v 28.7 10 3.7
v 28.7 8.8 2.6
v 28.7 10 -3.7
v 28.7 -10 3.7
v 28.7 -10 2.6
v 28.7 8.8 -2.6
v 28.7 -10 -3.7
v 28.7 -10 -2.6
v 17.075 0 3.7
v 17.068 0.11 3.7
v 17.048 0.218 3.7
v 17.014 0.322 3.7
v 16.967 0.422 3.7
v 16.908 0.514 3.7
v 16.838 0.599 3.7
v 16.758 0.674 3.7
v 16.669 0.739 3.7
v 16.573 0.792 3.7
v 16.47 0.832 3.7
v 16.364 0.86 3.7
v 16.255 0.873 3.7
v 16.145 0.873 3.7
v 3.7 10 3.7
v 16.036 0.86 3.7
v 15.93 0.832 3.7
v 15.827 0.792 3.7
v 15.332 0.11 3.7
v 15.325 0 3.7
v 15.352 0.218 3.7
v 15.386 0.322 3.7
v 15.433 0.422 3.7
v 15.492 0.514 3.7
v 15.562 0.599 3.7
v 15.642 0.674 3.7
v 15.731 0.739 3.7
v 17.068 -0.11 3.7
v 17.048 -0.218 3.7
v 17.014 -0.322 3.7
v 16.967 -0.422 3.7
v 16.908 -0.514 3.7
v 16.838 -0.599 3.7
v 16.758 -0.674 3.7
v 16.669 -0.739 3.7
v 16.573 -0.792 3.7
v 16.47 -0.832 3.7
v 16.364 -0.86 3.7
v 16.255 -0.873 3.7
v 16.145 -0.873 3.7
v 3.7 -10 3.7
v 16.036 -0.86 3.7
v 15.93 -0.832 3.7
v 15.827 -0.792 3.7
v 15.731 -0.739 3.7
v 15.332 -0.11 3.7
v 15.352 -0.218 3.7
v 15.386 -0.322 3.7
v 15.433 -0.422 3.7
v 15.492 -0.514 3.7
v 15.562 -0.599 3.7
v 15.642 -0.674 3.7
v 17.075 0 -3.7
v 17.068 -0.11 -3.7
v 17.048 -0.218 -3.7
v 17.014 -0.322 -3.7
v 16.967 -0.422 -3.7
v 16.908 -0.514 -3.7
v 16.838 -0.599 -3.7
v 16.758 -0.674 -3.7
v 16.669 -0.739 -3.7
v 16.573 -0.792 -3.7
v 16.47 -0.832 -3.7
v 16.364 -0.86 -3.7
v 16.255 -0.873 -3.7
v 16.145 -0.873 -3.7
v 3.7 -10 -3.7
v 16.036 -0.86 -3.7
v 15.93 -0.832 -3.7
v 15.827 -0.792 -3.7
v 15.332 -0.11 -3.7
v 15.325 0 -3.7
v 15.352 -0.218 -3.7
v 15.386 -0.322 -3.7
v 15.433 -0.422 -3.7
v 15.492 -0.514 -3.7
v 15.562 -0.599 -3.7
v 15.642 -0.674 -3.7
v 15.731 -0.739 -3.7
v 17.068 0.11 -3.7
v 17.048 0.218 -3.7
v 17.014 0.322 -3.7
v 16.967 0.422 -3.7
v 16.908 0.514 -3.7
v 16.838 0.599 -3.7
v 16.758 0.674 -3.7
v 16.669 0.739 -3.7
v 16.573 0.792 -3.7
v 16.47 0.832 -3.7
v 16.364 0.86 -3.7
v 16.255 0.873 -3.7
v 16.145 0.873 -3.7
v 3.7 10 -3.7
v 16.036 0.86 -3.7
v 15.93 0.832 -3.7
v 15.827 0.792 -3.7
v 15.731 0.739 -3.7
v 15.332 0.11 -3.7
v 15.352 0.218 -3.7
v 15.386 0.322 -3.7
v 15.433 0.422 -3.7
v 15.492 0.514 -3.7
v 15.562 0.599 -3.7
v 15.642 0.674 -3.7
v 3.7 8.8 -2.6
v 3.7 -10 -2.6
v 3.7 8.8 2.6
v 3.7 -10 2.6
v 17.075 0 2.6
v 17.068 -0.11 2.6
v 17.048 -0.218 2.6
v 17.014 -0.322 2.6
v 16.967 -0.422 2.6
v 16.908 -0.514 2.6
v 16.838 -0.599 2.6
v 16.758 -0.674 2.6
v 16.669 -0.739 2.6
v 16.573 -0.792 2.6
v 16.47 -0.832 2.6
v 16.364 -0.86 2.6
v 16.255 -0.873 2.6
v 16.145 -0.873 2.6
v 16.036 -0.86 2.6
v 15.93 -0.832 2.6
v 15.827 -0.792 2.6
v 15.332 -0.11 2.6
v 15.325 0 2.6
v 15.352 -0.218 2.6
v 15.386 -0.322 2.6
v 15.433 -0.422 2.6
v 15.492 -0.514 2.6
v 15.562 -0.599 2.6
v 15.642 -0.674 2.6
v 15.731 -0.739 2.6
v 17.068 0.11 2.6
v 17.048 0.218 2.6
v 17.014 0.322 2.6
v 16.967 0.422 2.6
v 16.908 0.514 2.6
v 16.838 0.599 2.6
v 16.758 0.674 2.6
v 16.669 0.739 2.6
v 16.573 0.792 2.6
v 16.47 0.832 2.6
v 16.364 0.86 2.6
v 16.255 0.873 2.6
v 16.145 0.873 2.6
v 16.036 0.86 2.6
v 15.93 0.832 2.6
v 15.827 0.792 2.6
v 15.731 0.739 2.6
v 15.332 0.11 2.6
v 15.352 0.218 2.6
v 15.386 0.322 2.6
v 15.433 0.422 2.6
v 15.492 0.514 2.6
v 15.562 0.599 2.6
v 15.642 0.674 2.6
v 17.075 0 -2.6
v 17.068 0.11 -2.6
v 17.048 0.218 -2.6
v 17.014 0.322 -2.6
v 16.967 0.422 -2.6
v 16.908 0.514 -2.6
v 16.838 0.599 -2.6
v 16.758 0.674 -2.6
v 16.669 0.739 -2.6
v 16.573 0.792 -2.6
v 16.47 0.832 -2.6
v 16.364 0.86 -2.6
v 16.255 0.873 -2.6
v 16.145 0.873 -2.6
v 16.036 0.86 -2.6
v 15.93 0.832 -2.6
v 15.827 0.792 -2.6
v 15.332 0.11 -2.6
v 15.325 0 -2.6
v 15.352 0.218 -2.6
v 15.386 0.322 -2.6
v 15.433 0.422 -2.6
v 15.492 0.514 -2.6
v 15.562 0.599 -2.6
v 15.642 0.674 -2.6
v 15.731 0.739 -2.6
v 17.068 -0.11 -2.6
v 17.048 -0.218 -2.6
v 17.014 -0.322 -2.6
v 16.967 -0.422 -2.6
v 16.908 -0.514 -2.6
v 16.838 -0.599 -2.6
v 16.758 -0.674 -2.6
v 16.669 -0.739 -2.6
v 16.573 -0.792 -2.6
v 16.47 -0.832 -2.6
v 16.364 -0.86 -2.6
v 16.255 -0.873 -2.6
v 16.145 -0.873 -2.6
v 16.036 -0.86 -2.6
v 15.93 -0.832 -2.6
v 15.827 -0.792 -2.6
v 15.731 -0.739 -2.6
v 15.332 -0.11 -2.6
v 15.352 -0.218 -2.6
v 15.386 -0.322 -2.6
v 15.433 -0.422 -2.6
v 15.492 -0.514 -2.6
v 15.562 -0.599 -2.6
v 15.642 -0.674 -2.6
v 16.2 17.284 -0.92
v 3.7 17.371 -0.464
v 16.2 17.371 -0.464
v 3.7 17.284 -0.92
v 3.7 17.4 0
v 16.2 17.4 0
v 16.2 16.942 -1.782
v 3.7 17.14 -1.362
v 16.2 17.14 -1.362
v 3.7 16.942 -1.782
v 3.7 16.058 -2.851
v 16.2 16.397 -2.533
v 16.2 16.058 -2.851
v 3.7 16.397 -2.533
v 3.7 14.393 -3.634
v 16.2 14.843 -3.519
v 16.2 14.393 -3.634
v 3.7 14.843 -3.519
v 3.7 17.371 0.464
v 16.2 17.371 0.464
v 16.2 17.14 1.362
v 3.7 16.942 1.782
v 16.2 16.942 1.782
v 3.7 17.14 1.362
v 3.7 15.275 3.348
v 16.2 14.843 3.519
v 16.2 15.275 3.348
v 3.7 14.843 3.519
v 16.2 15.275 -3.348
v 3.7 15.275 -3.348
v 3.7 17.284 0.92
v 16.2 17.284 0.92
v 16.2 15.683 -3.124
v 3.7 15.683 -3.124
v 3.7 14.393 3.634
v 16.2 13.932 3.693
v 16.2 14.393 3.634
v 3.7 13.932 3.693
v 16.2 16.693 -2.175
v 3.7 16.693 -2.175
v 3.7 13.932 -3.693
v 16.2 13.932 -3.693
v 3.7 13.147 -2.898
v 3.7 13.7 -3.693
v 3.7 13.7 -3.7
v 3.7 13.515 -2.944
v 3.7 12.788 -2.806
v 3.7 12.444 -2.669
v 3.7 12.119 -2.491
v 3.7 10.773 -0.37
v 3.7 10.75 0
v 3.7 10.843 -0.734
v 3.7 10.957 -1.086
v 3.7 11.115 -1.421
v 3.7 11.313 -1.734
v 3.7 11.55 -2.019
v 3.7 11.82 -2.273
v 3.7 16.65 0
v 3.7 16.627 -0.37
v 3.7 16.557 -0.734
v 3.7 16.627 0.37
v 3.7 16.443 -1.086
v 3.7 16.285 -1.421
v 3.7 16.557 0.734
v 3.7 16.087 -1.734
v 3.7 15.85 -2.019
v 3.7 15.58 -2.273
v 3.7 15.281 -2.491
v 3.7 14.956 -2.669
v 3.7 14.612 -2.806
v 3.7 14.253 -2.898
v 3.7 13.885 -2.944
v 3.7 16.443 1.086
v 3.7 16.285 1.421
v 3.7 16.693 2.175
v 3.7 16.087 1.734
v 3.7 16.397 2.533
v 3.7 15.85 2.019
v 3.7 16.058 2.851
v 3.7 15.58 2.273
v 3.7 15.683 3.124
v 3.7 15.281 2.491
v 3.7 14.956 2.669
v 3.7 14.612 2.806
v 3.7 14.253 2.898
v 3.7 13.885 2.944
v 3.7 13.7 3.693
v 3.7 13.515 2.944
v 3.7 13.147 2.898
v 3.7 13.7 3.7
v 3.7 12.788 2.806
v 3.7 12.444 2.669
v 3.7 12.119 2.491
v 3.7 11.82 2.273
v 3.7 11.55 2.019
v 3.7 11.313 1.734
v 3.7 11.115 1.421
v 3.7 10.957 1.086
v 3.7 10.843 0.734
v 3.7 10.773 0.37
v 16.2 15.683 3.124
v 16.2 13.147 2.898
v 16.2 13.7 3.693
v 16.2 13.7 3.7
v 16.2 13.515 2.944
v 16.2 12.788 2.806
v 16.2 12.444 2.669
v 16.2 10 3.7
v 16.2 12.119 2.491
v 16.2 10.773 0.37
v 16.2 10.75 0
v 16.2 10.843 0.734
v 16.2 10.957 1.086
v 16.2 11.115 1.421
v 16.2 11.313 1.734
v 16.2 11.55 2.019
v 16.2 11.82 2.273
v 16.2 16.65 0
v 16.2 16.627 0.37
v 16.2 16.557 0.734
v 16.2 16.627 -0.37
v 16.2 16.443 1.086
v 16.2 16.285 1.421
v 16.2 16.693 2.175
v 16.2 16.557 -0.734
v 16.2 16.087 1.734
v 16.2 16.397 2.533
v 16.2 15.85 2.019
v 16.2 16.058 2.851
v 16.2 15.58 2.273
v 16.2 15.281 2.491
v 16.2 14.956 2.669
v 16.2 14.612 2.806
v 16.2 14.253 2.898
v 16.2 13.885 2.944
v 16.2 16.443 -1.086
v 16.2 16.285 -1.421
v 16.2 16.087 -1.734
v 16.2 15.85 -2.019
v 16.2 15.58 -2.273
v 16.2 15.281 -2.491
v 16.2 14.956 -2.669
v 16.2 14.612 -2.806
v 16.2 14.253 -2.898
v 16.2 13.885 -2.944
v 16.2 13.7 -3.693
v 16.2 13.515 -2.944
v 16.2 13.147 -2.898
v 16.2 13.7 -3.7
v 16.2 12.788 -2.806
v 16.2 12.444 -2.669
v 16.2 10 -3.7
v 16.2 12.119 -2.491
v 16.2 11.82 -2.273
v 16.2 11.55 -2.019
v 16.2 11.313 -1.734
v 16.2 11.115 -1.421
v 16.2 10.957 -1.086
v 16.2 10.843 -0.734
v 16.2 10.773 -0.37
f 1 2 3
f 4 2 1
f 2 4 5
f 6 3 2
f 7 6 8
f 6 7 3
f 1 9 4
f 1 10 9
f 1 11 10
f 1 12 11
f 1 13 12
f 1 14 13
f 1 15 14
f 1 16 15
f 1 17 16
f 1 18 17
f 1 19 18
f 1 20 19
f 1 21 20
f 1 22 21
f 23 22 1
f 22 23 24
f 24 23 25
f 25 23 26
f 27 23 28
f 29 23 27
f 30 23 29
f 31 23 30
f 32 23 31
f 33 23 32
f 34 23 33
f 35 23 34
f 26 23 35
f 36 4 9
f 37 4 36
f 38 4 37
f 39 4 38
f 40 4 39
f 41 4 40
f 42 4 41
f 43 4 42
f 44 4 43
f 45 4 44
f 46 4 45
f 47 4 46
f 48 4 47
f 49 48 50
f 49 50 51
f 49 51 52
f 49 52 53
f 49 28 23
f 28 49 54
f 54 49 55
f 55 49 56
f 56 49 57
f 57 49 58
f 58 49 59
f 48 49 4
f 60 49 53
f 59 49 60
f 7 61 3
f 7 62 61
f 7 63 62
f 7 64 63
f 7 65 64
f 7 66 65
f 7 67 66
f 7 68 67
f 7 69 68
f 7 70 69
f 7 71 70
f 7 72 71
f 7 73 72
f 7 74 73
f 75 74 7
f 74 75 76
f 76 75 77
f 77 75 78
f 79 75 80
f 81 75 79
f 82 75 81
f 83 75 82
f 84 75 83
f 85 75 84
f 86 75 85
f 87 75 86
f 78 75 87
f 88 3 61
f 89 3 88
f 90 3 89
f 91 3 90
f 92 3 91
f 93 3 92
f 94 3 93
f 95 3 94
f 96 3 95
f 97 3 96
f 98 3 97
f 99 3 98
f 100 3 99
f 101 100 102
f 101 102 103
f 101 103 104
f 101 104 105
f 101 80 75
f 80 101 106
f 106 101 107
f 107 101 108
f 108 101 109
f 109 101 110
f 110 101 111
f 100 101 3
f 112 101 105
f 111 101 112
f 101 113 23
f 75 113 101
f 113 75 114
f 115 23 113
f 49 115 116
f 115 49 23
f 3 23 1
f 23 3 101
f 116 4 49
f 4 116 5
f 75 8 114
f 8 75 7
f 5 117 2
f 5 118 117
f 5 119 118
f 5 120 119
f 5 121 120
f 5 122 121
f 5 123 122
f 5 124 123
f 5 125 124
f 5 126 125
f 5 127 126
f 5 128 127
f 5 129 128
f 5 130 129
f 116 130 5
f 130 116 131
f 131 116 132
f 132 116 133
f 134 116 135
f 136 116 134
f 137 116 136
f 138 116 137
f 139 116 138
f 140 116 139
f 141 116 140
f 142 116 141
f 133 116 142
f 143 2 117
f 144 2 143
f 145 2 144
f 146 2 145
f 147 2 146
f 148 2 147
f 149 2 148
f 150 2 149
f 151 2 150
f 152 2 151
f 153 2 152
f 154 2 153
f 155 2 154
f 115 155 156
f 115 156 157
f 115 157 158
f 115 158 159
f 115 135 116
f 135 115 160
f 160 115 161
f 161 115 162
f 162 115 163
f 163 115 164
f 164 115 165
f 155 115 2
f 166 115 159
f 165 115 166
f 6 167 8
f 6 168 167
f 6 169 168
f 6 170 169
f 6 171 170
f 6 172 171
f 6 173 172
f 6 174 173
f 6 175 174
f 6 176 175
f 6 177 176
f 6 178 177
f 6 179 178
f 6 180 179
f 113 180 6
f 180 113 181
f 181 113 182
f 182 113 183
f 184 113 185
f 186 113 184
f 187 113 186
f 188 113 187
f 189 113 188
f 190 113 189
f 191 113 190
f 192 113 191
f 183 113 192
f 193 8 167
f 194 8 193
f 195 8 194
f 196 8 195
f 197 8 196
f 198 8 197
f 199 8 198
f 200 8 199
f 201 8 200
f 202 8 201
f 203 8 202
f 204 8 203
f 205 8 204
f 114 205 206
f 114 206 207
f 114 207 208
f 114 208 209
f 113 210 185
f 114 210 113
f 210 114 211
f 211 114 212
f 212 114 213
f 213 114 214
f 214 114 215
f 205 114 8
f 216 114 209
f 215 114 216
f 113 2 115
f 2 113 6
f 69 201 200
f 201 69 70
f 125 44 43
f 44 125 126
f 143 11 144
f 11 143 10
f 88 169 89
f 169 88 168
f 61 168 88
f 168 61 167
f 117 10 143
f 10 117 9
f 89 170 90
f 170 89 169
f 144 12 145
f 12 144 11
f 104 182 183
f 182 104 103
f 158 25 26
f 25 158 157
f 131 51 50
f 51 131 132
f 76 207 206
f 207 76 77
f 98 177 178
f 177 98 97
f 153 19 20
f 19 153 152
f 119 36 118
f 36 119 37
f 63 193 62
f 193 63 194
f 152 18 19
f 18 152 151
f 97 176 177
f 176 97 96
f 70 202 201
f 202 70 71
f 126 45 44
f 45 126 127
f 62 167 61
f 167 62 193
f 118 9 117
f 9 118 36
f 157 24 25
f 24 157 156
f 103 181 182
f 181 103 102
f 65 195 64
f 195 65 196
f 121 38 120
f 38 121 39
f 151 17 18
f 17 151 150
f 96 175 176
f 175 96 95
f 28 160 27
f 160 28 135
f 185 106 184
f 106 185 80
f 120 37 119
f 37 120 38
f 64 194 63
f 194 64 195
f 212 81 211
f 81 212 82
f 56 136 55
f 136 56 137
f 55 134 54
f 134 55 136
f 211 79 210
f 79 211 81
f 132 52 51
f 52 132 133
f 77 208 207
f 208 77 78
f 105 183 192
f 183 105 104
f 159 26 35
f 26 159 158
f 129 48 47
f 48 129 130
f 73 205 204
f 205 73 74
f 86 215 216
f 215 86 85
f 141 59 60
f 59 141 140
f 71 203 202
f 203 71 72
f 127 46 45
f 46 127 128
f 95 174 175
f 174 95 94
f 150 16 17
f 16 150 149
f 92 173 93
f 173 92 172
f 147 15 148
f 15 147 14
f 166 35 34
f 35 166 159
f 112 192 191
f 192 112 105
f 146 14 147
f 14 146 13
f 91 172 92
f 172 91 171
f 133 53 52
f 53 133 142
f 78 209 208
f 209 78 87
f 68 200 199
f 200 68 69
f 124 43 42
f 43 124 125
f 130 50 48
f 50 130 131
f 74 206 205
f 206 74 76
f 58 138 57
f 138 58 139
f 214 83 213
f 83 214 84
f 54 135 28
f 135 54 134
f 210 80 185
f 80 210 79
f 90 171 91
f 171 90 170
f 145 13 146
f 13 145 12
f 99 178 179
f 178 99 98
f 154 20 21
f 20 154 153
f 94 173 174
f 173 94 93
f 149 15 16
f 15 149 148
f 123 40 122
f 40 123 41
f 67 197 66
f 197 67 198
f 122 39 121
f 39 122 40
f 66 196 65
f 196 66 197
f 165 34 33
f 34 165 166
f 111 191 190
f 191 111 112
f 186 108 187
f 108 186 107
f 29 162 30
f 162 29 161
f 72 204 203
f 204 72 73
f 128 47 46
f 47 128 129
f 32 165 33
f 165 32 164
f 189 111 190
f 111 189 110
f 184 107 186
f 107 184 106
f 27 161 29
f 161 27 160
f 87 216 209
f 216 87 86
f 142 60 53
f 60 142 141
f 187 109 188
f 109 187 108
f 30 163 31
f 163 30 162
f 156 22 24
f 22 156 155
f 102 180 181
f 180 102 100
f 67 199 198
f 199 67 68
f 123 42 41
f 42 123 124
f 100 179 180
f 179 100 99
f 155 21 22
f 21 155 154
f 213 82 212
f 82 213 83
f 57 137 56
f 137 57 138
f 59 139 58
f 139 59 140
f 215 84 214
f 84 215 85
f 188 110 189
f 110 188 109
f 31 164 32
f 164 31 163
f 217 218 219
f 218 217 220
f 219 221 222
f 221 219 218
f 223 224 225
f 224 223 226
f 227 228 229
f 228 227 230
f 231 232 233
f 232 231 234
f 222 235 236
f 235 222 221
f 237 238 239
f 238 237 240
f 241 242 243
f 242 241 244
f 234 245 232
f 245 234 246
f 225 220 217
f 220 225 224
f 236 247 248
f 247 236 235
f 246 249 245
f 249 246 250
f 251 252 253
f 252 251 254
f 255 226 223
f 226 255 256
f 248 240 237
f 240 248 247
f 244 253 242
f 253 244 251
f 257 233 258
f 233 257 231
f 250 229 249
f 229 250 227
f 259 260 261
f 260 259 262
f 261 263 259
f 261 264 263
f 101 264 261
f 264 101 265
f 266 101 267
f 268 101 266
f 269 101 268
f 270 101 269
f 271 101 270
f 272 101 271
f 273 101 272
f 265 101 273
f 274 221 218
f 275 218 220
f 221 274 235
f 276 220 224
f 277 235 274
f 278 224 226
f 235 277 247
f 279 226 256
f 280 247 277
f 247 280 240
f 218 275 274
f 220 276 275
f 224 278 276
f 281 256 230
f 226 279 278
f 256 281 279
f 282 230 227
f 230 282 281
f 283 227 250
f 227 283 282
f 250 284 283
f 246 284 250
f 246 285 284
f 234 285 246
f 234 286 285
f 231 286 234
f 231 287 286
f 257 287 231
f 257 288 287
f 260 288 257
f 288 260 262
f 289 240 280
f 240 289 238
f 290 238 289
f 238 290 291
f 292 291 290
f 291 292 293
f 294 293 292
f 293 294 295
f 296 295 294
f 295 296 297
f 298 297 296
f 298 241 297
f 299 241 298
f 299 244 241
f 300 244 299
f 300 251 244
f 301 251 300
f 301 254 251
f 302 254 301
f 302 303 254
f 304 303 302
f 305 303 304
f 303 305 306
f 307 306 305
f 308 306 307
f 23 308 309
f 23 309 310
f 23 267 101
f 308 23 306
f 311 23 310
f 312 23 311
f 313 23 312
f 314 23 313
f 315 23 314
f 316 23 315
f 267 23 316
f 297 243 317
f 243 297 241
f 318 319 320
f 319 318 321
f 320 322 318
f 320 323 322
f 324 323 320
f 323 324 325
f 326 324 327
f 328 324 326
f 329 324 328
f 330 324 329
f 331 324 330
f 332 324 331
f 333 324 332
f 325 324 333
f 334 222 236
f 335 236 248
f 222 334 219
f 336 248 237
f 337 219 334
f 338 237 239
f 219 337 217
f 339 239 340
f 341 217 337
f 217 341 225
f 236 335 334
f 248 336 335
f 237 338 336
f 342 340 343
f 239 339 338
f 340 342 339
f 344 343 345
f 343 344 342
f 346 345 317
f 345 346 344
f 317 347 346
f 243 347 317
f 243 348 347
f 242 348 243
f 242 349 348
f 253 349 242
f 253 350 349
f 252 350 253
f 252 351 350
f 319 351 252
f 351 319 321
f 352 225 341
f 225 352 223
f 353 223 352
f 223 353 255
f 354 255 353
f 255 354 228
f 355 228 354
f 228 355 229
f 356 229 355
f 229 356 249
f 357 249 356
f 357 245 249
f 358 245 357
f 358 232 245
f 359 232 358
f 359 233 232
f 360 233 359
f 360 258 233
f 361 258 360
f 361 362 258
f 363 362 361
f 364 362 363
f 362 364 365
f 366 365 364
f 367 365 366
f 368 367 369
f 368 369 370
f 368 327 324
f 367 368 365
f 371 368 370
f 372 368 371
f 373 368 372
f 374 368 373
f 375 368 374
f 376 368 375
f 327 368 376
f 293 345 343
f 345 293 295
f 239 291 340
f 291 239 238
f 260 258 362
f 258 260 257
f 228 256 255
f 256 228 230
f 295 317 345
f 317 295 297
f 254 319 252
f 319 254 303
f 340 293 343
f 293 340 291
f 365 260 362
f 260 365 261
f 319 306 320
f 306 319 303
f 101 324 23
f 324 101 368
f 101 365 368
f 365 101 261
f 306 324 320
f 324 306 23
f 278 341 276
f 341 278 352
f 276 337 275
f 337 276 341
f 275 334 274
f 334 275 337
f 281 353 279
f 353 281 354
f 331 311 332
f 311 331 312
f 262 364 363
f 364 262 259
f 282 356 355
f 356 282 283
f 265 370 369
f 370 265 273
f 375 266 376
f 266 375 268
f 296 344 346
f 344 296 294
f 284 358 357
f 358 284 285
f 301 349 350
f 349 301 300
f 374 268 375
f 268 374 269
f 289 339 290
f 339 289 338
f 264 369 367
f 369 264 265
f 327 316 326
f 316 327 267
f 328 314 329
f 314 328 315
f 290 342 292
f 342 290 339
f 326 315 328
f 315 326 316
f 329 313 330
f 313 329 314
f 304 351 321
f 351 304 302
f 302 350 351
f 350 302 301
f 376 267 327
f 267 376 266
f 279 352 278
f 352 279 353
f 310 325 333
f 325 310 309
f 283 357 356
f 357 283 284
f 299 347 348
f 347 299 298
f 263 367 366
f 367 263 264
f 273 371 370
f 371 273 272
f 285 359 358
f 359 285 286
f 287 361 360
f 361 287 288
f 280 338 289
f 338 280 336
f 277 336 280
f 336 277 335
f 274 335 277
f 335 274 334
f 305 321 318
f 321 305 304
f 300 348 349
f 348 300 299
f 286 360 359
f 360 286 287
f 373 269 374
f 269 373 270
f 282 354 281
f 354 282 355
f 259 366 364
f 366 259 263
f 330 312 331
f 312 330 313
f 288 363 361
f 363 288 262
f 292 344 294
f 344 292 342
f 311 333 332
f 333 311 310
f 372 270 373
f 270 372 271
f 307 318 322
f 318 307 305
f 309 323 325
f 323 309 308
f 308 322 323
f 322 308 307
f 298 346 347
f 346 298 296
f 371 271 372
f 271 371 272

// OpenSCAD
//celkovy cas - 3:11

//variablength_of_connectors
/* [Hidden] */
//fragment number
$fn = 50;

/* [Main] */
//thickness of desks in mm
thickness_of_desks=5;
//thickness of walls in mm
thickness_of_walls = 1.2;
//length of connectors in mm
length_of_connectors = 25; 
//width of connectors in mm 
width_of_connectors = 20;

secure_filament_thickness = 1.75; //[1.75,3.0]

connector();

translate([thickness_of_desks/2+thickness_of_walls+length_of_connectors/2,thickness_of_desks/2+thickness_of_walls+width_of_connectors/2,0])rotate([-90,0,90])difference(){
union(){
cylinder(h=length_of_connectors/2, d=thickness_of_walls+thickness_of_walls+thickness_of_desks);
translate([-(thickness_of_desks+thickness_of_walls+thickness_of_walls)/2,-(thickness_of_desks+thickness_of_walls+thickness_of_walls)/2,0])cube([thickness_of_walls+thickness_of_desks/2,thickness_of_desks+thickness_of_walls+thickness_of_walls,length_of_connectors/2]);
}    cylinder(h=length_of_connectors/2, d=thickness_of_desks+3*thickness_of_walls/4);
}

module connector(){
    translate([(thickness_of_desks+(thickness_of_walls*2))/2,-width_of_connectors/2,-(thickness_of_desks+(thickness_of_walls*2))/2])difference(){
cube([length_of_connectors,width_of_connectors,thickness_of_desks+(thickness_of_walls*2)]);
translate([0,-thickness_of_walls,thickness_of_walls-0.1])cube([length_of_connectors,width_of_connectors,thickness_of_desks+0.2]);
translate([length_of_connectors/2,width_of_connectors/2,0])cylinder(h=thickness_of_desks+(thickness_of_walls*2), d=secure_filament_thickness );
}

}


module arc(){
translate([(0.1+(length_of_connectors/2)-secure_filament_thickness)+thickness_of_desks/2,width_of_connectors/2,-((0.1+(length_of_connectors/2)-secure_filament_thickness)+thickness_of_desks/2)])rotate([90,270,0])difference(){
intersection(){
union(){
cylinder(h=width_of_connectors, r = (length_of_connectors/2)-secure_filament_thickness);
cube([(length_of_connectors/2)-secure_filament_thickness,(length_of_connectors/2)-secure_filament_thickness,thickness_of_walls]);  
}
cube([(length_of_connectors/2)-secure_filament_thickness,(length_of_connectors/2)-secure_filament_thickness,width_of_connectors]);
}
cylinder(h=width_of_connectors, r = (length_of_connectors/2)-(secure_filament_thickness+thickness_of_walls-0.1));
}
}
module hinges(){
translate([3+thickness_of_desks/2+0.1,0,length_of_connectors-7.5+secure_filament_thickness/2])difference(){
union(){
cylinder(h=5, d=5);
translate([-3,-2.5,0])cube([3,5,5]);
}    cylinder(h=5, d=3);
}

}
